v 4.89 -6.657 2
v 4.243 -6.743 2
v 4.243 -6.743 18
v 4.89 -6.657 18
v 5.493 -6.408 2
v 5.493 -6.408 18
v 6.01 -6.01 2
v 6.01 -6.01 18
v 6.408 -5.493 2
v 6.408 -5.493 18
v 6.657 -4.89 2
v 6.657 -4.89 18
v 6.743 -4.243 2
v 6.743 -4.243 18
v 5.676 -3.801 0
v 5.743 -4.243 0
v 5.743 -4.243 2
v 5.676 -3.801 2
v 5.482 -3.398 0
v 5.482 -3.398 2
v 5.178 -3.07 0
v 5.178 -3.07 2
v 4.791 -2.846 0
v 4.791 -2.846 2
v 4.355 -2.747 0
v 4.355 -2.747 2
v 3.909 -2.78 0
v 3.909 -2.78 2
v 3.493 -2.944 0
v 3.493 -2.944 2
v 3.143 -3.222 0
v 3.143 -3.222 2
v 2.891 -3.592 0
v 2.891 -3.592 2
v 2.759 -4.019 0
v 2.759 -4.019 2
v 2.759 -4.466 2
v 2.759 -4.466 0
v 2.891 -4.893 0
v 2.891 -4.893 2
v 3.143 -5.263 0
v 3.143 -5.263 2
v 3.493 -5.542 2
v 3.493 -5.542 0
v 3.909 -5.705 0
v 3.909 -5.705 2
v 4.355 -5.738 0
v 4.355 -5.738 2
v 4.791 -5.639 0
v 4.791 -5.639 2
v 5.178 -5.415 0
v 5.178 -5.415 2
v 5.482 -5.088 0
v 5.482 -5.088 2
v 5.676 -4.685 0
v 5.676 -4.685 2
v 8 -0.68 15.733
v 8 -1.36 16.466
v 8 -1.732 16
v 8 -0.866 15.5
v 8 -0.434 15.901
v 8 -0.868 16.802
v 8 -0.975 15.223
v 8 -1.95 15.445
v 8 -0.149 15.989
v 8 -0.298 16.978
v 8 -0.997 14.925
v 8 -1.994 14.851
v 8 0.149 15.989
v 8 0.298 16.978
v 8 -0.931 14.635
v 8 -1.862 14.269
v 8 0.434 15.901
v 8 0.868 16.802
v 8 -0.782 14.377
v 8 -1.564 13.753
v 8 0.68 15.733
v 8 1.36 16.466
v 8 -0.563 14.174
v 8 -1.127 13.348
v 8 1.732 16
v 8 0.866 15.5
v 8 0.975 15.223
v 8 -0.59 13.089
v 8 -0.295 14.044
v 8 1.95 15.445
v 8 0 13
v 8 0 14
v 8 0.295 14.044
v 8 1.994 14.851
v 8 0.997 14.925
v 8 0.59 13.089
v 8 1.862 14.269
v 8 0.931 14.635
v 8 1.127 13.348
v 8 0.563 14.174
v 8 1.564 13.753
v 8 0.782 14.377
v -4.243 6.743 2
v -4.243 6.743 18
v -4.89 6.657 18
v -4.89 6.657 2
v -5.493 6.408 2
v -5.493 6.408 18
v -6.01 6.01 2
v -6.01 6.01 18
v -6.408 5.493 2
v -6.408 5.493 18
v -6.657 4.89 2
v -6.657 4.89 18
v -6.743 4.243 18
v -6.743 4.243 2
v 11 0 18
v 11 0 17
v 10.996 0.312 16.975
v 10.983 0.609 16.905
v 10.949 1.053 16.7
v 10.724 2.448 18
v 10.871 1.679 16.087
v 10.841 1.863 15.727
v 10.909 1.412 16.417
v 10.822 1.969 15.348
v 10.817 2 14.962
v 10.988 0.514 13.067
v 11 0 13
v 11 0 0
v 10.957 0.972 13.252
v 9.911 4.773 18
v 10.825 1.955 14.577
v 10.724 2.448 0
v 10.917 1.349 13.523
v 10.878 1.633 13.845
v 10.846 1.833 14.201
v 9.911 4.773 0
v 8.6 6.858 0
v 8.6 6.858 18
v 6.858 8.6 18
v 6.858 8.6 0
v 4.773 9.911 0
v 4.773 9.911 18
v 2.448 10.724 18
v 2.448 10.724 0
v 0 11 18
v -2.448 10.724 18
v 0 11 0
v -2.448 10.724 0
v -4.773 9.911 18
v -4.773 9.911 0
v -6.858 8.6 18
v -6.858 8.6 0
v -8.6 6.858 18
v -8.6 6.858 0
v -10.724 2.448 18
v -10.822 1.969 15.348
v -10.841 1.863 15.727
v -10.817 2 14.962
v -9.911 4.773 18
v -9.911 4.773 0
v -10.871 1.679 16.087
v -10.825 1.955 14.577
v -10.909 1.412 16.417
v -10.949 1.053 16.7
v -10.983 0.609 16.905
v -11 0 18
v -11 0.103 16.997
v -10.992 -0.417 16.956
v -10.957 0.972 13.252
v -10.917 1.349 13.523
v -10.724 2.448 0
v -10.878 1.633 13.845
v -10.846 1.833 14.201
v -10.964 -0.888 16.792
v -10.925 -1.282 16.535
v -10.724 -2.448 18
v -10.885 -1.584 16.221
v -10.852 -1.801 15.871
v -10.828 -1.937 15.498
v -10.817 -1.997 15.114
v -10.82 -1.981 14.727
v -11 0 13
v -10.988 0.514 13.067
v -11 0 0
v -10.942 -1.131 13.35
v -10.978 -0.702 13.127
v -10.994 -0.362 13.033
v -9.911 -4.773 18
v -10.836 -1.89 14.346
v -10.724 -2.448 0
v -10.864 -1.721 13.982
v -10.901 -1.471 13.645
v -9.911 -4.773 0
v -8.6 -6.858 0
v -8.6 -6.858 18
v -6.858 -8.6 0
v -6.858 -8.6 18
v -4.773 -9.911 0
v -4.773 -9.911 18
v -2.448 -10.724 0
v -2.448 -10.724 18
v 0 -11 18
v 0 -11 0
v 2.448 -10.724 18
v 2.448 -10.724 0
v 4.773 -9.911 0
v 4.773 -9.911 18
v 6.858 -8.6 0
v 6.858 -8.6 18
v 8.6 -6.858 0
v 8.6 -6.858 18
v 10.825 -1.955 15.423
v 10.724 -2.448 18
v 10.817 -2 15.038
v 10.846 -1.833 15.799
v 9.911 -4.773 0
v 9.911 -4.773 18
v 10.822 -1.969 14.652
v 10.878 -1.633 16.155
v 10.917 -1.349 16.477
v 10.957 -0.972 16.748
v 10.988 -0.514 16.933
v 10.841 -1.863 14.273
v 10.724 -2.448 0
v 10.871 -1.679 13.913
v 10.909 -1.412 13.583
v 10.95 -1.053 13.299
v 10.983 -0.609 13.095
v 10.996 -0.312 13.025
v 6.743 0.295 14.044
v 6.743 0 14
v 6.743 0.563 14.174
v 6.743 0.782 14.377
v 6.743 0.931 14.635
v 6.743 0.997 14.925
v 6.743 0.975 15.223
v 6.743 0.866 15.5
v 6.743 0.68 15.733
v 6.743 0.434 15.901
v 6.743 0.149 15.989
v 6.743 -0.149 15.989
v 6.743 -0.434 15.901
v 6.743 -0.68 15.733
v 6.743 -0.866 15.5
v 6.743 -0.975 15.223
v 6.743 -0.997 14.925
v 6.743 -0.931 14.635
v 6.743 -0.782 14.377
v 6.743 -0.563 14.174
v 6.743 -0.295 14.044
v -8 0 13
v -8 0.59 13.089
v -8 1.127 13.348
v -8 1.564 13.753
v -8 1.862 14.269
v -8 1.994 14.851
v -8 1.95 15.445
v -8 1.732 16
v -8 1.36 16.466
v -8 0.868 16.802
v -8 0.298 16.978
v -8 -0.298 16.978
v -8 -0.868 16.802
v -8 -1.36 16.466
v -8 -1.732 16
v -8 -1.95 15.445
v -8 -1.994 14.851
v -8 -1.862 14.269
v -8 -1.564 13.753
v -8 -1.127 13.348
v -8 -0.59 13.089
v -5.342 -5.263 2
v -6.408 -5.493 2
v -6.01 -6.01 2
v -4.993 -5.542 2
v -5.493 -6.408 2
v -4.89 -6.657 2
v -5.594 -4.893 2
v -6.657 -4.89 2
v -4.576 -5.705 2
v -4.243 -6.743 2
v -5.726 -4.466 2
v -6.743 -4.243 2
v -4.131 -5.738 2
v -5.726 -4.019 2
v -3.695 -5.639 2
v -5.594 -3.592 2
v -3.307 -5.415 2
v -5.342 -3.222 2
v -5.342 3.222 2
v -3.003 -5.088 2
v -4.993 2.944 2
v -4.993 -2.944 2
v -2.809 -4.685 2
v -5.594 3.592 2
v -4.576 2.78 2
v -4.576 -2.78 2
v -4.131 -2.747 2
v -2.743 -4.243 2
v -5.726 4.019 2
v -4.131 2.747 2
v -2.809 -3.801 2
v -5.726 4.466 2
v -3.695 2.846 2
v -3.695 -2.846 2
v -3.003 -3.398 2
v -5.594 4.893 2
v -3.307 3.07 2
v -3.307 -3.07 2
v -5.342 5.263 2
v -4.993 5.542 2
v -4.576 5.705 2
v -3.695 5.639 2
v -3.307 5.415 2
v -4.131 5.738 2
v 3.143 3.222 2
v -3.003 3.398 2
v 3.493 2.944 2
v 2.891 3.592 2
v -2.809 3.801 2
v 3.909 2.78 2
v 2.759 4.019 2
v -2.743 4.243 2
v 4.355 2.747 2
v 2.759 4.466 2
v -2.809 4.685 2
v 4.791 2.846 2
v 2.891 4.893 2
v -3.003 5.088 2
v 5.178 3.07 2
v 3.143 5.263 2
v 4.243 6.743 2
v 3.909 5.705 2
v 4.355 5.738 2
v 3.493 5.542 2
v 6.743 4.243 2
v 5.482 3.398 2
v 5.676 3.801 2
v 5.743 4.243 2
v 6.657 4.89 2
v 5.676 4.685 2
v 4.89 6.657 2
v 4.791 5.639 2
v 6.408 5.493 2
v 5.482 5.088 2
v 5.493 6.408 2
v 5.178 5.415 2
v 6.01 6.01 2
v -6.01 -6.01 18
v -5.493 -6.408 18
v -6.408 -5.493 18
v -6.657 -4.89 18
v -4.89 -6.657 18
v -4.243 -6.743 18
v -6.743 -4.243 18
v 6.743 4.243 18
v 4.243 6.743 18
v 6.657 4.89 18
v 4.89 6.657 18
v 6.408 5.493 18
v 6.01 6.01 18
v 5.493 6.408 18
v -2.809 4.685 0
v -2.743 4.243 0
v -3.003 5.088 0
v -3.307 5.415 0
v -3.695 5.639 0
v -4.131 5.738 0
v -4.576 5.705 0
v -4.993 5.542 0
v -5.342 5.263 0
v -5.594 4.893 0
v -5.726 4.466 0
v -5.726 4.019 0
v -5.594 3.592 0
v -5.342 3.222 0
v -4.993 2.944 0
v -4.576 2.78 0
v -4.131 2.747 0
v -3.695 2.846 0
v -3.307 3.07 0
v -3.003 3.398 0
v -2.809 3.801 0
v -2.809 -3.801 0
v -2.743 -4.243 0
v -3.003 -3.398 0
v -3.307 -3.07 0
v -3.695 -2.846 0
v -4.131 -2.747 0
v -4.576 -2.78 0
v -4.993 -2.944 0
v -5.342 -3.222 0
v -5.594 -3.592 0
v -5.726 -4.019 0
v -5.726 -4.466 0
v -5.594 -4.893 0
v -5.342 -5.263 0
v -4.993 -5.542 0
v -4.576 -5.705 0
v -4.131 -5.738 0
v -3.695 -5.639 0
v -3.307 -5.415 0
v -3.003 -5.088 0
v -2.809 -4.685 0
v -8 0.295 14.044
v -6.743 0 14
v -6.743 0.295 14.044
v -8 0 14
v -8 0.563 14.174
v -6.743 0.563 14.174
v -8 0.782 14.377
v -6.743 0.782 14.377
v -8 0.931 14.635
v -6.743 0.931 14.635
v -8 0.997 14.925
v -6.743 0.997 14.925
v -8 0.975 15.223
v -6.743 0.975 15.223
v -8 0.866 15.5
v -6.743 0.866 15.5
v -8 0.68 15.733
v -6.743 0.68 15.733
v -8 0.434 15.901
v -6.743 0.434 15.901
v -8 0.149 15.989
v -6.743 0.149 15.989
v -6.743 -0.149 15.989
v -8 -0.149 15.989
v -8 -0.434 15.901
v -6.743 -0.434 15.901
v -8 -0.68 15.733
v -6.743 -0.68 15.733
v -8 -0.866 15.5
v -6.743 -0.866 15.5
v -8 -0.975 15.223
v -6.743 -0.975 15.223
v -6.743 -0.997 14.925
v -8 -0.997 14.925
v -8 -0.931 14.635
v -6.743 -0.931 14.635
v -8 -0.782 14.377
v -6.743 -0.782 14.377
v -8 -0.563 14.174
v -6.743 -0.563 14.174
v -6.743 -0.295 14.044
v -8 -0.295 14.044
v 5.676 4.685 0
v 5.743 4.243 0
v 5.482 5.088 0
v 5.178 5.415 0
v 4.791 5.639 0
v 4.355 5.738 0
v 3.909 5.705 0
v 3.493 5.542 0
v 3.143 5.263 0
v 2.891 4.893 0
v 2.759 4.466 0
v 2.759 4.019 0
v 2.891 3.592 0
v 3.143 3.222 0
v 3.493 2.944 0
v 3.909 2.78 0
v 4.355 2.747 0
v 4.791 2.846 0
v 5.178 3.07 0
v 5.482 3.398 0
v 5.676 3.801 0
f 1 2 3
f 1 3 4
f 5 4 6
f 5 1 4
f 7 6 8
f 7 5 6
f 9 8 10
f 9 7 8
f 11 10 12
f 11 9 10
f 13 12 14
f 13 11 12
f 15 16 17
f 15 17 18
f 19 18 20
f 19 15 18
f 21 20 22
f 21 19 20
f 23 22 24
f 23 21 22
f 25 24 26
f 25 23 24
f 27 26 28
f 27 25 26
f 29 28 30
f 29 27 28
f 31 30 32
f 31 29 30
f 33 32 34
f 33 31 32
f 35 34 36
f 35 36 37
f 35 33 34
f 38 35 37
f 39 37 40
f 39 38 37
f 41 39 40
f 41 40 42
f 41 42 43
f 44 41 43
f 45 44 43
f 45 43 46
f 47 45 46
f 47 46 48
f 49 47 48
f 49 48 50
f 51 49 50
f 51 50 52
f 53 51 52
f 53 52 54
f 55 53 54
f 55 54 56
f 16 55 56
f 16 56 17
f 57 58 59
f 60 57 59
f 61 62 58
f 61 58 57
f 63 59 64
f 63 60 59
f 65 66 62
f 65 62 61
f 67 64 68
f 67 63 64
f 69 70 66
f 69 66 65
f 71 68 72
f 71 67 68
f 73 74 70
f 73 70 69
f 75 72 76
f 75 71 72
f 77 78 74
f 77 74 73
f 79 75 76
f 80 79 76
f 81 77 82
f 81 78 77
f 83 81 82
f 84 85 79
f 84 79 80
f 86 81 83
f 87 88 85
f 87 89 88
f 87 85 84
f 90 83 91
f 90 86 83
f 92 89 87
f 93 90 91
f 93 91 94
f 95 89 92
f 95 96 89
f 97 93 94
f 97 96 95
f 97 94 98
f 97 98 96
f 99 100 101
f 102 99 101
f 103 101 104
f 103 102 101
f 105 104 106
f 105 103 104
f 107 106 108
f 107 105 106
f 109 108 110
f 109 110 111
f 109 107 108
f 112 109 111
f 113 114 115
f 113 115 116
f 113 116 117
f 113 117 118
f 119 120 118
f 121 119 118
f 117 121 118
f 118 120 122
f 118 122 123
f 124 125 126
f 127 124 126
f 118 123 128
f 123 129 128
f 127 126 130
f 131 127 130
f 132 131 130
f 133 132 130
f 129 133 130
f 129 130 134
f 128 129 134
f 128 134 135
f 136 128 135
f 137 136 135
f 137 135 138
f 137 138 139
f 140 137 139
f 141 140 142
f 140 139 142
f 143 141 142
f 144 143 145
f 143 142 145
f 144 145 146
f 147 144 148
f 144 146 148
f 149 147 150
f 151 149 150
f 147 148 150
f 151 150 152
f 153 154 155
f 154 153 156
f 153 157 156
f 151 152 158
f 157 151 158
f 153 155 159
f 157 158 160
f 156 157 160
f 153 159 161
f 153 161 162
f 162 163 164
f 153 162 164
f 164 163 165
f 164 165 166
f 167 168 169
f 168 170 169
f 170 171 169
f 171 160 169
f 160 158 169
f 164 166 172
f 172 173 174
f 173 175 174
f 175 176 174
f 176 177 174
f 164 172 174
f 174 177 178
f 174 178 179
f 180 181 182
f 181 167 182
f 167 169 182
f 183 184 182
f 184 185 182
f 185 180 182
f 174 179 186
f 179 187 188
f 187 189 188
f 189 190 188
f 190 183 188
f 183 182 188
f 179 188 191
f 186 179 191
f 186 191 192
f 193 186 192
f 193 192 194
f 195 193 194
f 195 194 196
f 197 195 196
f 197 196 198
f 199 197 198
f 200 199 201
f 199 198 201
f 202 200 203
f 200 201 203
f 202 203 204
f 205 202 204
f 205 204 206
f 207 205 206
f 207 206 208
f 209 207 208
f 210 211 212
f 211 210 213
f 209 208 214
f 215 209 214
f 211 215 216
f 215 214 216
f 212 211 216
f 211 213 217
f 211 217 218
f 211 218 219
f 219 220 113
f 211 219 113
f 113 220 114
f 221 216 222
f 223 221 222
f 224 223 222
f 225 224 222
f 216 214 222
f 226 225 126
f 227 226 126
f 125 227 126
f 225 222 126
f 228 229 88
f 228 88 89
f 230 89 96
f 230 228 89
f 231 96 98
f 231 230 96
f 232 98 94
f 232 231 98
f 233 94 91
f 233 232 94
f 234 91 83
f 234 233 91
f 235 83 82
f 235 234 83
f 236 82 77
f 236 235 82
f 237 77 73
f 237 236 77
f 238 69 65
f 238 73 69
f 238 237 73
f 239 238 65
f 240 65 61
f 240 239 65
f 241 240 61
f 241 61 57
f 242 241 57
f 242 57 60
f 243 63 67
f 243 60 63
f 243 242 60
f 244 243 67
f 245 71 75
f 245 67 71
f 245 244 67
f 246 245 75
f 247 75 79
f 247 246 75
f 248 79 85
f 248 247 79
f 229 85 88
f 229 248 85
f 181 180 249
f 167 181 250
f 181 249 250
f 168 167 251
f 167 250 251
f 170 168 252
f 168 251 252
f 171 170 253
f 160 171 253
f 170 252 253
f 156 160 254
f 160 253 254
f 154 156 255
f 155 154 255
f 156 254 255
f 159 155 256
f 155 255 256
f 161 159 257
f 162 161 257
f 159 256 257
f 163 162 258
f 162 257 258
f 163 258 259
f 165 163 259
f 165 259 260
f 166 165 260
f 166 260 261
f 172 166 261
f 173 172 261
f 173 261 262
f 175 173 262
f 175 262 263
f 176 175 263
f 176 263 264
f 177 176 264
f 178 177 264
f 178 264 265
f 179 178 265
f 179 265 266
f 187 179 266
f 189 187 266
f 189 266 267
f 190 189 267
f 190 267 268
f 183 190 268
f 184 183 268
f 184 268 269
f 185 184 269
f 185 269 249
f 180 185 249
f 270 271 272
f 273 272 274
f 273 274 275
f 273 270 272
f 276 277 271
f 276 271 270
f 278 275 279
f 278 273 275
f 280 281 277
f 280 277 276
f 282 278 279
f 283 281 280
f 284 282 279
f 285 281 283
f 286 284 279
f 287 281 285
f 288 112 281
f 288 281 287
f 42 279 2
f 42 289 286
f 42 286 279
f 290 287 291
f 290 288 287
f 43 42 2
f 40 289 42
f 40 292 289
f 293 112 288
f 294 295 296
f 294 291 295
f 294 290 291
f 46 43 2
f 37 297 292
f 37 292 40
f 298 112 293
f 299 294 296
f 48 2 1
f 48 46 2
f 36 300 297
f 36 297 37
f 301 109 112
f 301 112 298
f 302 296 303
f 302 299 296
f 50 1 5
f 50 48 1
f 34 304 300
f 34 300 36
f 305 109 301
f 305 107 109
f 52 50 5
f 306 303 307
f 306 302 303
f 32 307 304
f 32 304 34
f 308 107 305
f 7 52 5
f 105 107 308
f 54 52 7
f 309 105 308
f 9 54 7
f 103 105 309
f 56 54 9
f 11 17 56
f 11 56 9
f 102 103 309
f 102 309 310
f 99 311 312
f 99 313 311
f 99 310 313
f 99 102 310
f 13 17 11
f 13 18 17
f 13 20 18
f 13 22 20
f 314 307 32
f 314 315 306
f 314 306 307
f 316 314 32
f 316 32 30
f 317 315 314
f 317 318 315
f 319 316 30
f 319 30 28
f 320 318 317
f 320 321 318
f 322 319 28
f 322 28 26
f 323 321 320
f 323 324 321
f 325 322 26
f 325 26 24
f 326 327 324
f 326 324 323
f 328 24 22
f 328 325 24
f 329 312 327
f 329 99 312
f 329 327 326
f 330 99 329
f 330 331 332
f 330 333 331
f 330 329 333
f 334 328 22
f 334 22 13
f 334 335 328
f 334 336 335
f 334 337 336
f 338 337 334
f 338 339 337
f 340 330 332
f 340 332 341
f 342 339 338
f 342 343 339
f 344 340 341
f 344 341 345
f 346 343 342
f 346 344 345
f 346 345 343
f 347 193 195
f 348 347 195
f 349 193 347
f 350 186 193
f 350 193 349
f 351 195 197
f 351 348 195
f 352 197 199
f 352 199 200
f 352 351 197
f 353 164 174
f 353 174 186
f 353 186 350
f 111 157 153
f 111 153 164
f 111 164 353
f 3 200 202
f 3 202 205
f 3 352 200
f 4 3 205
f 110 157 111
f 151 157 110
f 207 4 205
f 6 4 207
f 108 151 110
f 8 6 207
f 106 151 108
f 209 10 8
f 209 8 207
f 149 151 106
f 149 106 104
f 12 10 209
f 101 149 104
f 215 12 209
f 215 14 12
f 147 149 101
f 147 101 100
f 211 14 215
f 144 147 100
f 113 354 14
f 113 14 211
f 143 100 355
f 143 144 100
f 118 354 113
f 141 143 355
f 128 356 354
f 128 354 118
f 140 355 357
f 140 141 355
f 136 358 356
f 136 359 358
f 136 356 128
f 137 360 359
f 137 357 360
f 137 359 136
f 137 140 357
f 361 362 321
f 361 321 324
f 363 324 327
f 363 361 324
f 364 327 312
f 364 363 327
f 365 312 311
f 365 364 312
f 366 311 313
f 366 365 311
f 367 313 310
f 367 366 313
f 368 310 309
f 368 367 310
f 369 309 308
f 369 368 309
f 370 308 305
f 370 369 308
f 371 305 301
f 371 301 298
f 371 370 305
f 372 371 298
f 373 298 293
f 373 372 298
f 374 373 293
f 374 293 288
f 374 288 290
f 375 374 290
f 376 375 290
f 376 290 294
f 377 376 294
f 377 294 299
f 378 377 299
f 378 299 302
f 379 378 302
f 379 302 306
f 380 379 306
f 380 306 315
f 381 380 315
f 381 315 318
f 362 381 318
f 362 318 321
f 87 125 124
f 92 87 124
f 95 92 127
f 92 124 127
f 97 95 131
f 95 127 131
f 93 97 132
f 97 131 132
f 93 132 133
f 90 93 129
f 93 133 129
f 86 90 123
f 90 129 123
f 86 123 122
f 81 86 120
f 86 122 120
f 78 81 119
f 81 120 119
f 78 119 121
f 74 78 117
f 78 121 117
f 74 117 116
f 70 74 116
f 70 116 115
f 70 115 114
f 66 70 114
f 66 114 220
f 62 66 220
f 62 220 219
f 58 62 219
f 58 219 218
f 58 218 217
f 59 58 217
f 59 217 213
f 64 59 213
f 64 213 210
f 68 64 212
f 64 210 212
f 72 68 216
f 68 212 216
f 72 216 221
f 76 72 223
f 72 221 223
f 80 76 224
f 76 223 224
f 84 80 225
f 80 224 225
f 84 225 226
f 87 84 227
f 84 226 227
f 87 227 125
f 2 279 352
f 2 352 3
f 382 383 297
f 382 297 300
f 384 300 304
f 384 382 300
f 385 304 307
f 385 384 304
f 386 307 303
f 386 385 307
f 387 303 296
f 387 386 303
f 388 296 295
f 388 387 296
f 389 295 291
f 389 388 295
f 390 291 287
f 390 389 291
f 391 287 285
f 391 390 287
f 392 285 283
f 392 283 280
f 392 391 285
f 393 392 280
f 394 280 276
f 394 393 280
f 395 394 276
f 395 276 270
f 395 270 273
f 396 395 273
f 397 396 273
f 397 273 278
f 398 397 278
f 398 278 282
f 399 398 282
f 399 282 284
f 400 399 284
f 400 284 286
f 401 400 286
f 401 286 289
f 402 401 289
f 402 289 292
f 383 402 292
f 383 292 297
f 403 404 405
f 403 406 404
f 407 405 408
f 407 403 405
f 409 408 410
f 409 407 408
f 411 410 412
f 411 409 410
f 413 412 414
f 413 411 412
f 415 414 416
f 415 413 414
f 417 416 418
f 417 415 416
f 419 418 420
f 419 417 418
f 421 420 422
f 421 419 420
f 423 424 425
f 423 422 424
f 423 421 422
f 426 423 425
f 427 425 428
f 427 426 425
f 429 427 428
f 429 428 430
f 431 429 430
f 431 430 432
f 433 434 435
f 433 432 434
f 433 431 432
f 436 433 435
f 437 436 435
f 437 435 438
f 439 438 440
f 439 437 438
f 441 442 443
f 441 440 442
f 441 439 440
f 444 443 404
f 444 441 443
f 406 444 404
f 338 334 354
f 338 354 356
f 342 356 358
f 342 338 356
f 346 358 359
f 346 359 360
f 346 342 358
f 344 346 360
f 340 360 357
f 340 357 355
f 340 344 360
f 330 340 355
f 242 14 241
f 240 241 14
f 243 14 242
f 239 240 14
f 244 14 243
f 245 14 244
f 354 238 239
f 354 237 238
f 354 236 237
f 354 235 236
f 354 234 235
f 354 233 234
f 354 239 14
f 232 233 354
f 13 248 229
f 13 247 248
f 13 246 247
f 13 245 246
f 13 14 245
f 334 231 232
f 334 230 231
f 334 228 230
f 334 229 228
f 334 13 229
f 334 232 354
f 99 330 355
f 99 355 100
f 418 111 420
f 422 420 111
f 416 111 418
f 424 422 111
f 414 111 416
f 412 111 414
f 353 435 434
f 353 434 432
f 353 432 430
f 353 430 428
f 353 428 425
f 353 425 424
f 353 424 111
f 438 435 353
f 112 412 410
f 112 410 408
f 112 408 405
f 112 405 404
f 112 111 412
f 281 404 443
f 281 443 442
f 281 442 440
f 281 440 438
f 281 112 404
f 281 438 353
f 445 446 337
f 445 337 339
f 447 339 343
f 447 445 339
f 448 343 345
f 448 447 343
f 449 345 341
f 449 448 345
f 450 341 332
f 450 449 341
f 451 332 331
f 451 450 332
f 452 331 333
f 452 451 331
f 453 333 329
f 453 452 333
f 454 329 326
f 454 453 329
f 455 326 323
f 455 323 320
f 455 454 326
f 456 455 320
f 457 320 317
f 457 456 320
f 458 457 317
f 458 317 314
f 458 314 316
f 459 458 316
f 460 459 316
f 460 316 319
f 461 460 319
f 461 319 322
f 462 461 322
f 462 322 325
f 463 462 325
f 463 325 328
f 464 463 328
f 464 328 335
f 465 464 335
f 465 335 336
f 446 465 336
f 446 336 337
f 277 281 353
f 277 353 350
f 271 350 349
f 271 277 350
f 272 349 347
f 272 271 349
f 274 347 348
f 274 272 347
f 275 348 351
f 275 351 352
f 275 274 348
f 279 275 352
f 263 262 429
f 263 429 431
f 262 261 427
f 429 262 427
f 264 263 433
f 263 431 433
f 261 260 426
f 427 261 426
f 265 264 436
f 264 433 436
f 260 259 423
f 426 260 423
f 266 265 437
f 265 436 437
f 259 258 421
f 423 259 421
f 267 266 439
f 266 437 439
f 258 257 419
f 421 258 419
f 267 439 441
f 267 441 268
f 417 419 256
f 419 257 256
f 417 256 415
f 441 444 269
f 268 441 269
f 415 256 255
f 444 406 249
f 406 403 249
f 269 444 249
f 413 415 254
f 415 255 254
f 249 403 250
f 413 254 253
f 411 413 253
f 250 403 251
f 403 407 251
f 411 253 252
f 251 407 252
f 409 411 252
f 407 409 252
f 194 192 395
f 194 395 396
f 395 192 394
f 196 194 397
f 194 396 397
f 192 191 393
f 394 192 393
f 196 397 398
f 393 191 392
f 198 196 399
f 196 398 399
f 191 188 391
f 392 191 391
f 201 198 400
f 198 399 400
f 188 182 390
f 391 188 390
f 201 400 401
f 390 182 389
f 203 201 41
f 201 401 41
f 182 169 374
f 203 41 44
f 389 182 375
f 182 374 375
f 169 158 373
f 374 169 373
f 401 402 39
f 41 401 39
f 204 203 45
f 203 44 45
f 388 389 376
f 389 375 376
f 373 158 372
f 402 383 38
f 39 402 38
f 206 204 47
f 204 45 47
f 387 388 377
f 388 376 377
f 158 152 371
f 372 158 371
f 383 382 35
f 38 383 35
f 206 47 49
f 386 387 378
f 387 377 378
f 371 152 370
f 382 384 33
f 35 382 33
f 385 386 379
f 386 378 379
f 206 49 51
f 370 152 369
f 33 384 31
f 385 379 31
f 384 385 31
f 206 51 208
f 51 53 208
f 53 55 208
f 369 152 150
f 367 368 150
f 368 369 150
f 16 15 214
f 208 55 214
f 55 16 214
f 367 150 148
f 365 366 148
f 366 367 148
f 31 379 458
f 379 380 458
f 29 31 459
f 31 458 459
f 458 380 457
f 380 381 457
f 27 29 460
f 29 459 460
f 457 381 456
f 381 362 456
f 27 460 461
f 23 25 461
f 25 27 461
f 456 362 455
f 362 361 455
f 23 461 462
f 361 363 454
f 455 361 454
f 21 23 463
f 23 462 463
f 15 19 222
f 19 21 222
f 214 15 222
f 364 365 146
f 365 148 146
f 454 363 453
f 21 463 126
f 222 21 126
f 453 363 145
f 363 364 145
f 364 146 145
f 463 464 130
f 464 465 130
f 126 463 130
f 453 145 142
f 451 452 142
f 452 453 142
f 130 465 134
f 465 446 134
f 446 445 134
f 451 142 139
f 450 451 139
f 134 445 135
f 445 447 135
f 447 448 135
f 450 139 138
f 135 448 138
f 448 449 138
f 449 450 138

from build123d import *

# Parameters (mm, degrees)
SKETCH1_R               = 11
SKETCH1_R_2             = 1.5
BOSS_EXTRUDE1_DEPTH     = 18
CUT_EXTRUDE2_DEPTH      = 24.790754507
CUT_EXTRUDE2_DEPTH_BACK = 24.790754507
SKETCH3_R               = 1
CUT_EXTRUDE3_START      = -8
SKETCH4_R               = 2
CUT_EXTRUDE3_DEPTH      = 5
CUT_EXTRUDE4_START      = 13
SKETCH4_2_R             = 2
CUT_EXTRUDE4_DEPTH      = 5
CUT_EXTRUDE5_DEPTH      = 16


with BuildPart() as part:
    # Sketch1 → Boss-Extrude1 (new body)
    with BuildSketch(Plane.XY):
        Circle(SKETCH1_R)
        with Locations((-4.242640687, 4.242640687)):
            Circle(SKETCH1_R_2, mode=Mode.SUBTRACT)
        with Locations((4.242640687, 4.242640687)):
            Circle(SKETCH1_R_2, mode=Mode.SUBTRACT)
        with Locations((4.242640687, -4.242640687)):
            Circle(SKETCH1_R_2, mode=Mode.SUBTRACT)
        with Locations((-4.242640687, -4.242640687)):
            Circle(SKETCH1_R_2, mode=Mode.SUBTRACT)
    extrude(amount=BOSS_EXTRUDE1_DEPTH)

    # Sketch3 → Cut-Extrude2 (cut, two sides: drawn at the far end of the back side and taken through both)
    with BuildSketch(Plane(origin=(0, 0, 0), x_dir=(0, 0, -1), z_dir=(1, 0, 0)).offset(-CUT_EXTRUDE2_DEPTH_BACK)):
        with Locations((-15, 0)):
            Circle(SKETCH3_R)
    extrude(amount=CUT_EXTRUDE2_DEPTH + CUT_EXTRUDE2_DEPTH_BACK, mode=Mode.SUBTRACT)

    # Sketch4 → Cut-Extrude3 (cut)
    with BuildSketch(Plane(origin=(0, 0, 0), x_dir=(0, 0, -1), z_dir=(1, 0, 0)).offset(CUT_EXTRUDE3_START)):
        with Locations((-15, 0)):
            Circle(SKETCH4_R)
    extrude(amount=-CUT_EXTRUDE3_DEPTH, mode=Mode.SUBTRACT)

    # Sketch4<2> → Cut-Extrude4 (cut)
    with BuildSketch(Plane(origin=(0, 0, 0), x_dir=(0, 0, -1), z_dir=(1, 0, 0)).offset(CUT_EXTRUDE4_START)):
        with Locations((-15, 0)):
            Circle(SKETCH4_2_R)
    extrude(amount=-CUT_EXTRUDE4_DEPTH, mode=Mode.SUBTRACT)

    # Sketch2 → Cut-Extrude5 (cut)
    with BuildSketch(Plane.XY.offset(18)):
        with BuildLine():
            Line((4.242640687, 6.742640687), (-4.242640687, 6.742640687))
            ThreePointArc((-4.242640687, 6.742640687), (-6.01040764, 6.01040764), (-6.742640687, 4.242640687))
            Line((-6.742640687, 4.242640687), (-6.742640687, -4.242640687))
            ThreePointArc((-6.742640687, -4.242640687), (-6.01040764, -6.01040764), (-4.242640687, -6.742640687))
            Line((-4.242640687, -6.742640687), (4.242640687, -6.742640687))
            ThreePointArc((4.242640687, -6.742640687), (6.01040764, -6.01040764), (6.742640687, -4.242640687))
            Line((6.742640687, -4.242640687), (6.742640687, 4.242640687))
            ThreePointArc((6.742640687, 4.242640687), (6.01040764, 6.01040764), (4.242640687, 6.742640687))
        make_face()
    extrude(amount=-CUT_EXTRUDE5_DEPTH, mode=Mode.SUBTRACT)


solid = part.part
